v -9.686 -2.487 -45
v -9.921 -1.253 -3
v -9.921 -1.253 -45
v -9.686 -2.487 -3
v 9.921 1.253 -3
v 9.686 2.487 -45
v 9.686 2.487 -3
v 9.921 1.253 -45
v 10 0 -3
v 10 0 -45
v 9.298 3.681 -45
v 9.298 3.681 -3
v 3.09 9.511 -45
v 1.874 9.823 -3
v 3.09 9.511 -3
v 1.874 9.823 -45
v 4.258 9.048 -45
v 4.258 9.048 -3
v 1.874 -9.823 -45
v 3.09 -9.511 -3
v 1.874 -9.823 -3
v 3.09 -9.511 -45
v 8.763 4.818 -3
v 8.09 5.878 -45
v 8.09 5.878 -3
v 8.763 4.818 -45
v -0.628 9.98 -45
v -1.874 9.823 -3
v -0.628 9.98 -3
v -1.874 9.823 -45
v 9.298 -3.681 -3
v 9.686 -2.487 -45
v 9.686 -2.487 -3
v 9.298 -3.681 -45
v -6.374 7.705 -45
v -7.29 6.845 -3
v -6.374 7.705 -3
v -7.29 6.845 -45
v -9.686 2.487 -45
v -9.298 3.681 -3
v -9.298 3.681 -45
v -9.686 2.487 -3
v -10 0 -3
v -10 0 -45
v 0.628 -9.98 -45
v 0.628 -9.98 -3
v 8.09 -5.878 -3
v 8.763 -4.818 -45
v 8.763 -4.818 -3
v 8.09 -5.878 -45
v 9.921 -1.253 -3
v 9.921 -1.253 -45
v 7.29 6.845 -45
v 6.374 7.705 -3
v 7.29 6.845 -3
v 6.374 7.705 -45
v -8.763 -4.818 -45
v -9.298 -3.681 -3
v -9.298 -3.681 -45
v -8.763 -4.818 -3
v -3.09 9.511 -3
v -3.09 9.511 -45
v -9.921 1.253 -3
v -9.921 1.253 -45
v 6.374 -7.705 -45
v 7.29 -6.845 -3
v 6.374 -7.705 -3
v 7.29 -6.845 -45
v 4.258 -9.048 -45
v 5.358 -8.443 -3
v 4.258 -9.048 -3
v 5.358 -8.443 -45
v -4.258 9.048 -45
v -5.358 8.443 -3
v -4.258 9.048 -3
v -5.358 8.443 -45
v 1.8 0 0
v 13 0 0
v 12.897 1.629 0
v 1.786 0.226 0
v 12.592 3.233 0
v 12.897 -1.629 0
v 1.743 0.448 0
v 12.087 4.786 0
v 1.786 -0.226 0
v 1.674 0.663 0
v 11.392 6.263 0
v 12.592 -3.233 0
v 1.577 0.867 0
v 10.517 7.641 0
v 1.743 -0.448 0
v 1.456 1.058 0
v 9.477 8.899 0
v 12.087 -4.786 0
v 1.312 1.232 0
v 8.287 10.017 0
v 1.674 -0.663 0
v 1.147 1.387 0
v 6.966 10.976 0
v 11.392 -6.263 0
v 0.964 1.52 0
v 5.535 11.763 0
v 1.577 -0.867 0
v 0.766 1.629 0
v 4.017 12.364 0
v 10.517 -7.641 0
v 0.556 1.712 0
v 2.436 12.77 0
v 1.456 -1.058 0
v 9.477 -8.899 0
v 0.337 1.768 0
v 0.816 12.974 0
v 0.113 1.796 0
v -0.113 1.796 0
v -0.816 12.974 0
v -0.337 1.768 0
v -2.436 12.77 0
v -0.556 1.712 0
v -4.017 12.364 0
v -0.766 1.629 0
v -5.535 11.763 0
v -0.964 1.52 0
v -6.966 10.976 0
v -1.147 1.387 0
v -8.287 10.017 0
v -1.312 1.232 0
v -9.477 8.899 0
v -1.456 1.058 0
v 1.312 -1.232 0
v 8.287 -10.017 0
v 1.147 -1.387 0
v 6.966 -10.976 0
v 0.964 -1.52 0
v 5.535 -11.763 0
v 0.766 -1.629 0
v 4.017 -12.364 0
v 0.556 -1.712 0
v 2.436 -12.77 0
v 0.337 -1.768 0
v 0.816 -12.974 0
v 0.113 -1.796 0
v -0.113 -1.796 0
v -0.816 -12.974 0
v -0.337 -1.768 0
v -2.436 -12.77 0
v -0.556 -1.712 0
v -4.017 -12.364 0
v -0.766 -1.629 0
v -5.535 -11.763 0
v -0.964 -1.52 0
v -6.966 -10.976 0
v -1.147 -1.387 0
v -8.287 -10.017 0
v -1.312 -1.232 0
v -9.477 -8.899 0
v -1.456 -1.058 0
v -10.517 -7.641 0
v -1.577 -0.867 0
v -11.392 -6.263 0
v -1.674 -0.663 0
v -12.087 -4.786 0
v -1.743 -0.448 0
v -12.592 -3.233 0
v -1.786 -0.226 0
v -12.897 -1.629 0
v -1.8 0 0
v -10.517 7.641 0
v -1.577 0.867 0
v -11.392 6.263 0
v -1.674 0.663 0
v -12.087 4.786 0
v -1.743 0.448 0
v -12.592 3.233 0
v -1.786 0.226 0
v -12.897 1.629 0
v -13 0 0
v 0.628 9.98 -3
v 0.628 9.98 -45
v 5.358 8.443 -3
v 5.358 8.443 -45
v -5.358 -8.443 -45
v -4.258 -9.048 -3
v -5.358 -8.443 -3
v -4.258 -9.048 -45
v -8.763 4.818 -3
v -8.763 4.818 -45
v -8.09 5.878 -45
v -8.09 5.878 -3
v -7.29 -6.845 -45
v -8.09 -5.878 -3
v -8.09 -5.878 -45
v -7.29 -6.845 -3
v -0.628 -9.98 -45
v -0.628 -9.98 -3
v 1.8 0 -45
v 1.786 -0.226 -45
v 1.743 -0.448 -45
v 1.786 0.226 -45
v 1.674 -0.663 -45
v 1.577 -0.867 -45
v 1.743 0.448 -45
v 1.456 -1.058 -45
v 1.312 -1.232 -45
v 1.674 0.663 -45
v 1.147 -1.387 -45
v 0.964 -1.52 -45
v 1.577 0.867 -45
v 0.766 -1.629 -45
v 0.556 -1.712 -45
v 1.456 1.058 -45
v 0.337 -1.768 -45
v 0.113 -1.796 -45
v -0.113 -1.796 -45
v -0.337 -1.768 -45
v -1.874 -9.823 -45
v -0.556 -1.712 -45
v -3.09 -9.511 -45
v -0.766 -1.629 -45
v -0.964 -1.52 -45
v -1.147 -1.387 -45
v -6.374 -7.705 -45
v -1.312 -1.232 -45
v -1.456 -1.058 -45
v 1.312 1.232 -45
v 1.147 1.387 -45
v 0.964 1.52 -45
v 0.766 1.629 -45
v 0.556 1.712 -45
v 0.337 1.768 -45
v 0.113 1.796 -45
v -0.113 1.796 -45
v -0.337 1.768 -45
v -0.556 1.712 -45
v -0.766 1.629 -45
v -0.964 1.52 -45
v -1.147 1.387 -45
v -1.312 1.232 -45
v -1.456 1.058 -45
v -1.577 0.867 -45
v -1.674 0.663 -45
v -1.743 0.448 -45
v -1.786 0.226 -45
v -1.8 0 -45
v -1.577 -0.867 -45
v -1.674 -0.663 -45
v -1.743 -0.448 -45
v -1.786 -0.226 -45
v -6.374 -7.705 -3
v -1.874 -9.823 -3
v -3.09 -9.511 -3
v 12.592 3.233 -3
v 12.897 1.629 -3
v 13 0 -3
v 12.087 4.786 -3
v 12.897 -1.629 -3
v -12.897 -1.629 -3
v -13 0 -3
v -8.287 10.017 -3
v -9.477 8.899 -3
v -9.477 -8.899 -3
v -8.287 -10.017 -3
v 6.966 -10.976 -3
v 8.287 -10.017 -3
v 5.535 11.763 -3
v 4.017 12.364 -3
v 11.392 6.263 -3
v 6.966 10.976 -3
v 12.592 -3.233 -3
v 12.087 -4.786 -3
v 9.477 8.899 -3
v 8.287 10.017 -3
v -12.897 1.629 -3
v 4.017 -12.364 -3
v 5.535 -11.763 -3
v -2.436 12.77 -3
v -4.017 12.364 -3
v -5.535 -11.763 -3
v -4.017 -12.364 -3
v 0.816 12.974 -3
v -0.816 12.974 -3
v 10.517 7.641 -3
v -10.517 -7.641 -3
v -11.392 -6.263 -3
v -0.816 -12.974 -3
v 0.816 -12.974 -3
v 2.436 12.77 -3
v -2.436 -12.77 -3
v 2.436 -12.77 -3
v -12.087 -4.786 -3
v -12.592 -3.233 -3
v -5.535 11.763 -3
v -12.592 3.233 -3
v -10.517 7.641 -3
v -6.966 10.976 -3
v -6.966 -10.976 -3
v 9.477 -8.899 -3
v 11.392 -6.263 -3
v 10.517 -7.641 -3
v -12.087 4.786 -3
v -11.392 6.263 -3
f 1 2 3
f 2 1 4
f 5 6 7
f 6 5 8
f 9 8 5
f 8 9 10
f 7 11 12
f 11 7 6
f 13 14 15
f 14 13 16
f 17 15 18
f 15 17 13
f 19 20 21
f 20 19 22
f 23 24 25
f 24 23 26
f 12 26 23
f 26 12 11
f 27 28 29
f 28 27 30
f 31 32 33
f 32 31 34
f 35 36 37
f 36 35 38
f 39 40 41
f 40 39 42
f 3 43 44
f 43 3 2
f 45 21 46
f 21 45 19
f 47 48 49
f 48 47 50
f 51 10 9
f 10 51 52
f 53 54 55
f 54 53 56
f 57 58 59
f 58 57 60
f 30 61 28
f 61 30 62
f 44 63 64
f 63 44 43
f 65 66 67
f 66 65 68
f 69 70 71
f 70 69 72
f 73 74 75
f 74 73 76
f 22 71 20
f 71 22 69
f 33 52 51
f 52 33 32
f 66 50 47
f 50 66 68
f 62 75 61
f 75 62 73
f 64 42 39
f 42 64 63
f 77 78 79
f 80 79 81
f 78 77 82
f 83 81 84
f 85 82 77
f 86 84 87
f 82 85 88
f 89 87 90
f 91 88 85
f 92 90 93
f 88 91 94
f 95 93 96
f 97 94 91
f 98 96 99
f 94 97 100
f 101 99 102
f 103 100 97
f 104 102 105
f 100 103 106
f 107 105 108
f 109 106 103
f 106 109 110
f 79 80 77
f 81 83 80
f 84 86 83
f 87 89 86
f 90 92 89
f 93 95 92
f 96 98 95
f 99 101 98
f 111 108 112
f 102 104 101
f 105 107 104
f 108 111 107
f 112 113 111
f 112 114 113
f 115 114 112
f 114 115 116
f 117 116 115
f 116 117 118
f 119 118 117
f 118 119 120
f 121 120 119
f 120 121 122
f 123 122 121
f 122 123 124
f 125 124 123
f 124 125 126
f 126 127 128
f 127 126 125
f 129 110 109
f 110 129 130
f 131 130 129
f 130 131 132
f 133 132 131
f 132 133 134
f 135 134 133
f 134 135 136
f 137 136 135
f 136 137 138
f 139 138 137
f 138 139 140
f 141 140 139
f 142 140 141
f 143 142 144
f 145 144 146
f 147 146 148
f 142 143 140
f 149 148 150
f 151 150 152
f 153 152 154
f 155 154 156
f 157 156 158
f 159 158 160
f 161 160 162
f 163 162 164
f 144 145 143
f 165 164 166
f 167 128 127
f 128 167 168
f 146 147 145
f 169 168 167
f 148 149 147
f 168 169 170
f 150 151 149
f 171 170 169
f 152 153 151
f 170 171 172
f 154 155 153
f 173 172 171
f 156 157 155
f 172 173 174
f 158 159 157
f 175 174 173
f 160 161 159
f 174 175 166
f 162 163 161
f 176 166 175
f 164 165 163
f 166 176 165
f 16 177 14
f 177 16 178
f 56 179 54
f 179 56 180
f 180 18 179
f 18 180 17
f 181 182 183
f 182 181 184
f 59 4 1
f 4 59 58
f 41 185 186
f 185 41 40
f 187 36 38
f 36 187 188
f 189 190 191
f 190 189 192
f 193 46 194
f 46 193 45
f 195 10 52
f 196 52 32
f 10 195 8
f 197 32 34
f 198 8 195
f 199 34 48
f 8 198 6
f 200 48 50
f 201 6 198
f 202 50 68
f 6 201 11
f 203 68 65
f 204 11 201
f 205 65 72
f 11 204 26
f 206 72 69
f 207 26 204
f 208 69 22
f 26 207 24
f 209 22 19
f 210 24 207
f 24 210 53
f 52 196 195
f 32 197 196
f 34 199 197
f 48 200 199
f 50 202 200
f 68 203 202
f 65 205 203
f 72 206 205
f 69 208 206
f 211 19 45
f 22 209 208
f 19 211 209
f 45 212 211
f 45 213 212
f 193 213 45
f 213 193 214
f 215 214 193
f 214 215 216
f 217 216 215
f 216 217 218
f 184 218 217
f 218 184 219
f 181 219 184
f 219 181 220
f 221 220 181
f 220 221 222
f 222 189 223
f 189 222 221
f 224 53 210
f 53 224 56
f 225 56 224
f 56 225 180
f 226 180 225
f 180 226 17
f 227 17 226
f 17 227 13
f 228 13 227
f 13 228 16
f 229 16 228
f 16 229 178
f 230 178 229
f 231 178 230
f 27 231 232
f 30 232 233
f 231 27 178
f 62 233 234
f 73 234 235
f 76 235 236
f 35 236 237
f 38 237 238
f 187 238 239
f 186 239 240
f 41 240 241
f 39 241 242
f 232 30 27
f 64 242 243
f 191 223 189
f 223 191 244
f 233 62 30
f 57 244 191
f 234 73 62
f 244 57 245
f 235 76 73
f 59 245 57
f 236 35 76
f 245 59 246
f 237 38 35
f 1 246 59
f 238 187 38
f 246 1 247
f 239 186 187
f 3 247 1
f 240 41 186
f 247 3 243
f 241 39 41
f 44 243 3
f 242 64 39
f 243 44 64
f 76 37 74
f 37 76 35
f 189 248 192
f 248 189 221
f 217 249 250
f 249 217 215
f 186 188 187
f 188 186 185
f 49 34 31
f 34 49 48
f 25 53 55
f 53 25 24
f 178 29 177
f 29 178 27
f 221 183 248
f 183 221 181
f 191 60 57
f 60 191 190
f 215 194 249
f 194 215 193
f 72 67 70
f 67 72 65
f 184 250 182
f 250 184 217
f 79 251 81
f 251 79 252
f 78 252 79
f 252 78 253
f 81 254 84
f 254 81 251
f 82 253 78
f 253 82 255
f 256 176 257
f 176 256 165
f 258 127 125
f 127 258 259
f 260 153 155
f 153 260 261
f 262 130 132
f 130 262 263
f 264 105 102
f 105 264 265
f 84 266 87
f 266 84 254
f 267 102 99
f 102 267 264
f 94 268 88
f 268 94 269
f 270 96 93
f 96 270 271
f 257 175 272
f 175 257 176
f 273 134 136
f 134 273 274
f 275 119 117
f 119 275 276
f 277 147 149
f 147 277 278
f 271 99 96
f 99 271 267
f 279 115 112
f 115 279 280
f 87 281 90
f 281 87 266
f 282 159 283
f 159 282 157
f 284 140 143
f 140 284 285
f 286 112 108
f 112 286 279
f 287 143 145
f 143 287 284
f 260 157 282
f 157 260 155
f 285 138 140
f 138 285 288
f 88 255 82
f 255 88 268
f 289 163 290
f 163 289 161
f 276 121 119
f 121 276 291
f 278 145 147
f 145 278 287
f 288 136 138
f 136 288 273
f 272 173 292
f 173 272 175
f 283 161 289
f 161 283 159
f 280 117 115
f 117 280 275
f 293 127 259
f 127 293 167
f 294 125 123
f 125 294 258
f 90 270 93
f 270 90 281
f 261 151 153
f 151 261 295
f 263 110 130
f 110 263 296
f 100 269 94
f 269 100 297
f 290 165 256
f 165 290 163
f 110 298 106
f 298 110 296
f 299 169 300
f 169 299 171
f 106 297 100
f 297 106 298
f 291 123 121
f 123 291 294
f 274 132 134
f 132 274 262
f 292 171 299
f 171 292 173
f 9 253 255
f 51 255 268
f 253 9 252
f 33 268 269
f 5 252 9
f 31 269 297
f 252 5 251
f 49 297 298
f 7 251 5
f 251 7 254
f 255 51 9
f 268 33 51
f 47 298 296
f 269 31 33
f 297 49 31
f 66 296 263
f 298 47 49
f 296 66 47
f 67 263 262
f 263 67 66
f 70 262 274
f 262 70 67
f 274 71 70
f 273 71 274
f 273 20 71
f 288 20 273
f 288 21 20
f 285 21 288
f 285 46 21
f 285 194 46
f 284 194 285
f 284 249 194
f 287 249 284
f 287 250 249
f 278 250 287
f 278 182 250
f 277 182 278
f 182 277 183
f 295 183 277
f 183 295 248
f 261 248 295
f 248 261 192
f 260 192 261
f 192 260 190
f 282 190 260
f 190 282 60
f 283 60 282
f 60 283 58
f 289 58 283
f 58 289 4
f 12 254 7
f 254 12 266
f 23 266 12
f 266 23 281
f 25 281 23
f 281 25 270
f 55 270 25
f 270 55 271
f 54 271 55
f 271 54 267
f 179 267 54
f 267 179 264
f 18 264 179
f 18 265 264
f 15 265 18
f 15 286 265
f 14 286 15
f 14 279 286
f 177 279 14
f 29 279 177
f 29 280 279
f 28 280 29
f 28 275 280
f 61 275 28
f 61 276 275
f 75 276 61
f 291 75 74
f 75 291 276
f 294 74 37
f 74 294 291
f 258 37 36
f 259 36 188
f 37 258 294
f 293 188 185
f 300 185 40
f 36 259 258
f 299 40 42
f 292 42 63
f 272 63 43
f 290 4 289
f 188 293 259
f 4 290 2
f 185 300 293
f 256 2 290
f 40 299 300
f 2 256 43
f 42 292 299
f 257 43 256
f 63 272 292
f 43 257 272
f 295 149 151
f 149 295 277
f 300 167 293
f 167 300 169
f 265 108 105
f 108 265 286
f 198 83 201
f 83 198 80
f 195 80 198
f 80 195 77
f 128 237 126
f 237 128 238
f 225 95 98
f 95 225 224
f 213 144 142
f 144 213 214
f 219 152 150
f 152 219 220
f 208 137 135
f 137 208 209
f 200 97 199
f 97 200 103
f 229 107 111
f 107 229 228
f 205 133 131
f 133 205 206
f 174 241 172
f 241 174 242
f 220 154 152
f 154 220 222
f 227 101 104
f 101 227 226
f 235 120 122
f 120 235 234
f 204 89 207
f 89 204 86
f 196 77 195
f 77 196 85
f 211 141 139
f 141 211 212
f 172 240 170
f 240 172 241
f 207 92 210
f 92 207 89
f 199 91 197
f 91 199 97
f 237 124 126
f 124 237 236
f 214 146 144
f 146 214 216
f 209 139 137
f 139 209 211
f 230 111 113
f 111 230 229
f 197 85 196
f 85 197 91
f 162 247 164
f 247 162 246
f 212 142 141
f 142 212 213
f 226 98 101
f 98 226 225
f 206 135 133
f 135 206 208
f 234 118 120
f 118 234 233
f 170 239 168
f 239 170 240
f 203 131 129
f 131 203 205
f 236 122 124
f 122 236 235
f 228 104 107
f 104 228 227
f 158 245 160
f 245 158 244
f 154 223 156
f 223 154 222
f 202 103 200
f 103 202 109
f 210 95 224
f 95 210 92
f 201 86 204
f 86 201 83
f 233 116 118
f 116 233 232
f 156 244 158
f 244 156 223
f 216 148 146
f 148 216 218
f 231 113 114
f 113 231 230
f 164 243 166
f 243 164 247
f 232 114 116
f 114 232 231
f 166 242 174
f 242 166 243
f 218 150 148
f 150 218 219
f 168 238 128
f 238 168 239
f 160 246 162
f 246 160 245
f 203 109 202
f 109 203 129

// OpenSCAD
$fn = 50;


difference() {
	union() {
		translate(v = [0, 0, -45.0000000000]) {
			cylinder(h = 45, r = 10.0000000000);
		}
		translate(v = [0, 0, -3.0000000000]) {
			cylinder(h = 3, r = 13.0000000000);
		}
	}
	union() {
		#translate(v = [0, 0, -45]) {
			cylinder(h = 45, r = 1.8000000000);
		}
	}
}
